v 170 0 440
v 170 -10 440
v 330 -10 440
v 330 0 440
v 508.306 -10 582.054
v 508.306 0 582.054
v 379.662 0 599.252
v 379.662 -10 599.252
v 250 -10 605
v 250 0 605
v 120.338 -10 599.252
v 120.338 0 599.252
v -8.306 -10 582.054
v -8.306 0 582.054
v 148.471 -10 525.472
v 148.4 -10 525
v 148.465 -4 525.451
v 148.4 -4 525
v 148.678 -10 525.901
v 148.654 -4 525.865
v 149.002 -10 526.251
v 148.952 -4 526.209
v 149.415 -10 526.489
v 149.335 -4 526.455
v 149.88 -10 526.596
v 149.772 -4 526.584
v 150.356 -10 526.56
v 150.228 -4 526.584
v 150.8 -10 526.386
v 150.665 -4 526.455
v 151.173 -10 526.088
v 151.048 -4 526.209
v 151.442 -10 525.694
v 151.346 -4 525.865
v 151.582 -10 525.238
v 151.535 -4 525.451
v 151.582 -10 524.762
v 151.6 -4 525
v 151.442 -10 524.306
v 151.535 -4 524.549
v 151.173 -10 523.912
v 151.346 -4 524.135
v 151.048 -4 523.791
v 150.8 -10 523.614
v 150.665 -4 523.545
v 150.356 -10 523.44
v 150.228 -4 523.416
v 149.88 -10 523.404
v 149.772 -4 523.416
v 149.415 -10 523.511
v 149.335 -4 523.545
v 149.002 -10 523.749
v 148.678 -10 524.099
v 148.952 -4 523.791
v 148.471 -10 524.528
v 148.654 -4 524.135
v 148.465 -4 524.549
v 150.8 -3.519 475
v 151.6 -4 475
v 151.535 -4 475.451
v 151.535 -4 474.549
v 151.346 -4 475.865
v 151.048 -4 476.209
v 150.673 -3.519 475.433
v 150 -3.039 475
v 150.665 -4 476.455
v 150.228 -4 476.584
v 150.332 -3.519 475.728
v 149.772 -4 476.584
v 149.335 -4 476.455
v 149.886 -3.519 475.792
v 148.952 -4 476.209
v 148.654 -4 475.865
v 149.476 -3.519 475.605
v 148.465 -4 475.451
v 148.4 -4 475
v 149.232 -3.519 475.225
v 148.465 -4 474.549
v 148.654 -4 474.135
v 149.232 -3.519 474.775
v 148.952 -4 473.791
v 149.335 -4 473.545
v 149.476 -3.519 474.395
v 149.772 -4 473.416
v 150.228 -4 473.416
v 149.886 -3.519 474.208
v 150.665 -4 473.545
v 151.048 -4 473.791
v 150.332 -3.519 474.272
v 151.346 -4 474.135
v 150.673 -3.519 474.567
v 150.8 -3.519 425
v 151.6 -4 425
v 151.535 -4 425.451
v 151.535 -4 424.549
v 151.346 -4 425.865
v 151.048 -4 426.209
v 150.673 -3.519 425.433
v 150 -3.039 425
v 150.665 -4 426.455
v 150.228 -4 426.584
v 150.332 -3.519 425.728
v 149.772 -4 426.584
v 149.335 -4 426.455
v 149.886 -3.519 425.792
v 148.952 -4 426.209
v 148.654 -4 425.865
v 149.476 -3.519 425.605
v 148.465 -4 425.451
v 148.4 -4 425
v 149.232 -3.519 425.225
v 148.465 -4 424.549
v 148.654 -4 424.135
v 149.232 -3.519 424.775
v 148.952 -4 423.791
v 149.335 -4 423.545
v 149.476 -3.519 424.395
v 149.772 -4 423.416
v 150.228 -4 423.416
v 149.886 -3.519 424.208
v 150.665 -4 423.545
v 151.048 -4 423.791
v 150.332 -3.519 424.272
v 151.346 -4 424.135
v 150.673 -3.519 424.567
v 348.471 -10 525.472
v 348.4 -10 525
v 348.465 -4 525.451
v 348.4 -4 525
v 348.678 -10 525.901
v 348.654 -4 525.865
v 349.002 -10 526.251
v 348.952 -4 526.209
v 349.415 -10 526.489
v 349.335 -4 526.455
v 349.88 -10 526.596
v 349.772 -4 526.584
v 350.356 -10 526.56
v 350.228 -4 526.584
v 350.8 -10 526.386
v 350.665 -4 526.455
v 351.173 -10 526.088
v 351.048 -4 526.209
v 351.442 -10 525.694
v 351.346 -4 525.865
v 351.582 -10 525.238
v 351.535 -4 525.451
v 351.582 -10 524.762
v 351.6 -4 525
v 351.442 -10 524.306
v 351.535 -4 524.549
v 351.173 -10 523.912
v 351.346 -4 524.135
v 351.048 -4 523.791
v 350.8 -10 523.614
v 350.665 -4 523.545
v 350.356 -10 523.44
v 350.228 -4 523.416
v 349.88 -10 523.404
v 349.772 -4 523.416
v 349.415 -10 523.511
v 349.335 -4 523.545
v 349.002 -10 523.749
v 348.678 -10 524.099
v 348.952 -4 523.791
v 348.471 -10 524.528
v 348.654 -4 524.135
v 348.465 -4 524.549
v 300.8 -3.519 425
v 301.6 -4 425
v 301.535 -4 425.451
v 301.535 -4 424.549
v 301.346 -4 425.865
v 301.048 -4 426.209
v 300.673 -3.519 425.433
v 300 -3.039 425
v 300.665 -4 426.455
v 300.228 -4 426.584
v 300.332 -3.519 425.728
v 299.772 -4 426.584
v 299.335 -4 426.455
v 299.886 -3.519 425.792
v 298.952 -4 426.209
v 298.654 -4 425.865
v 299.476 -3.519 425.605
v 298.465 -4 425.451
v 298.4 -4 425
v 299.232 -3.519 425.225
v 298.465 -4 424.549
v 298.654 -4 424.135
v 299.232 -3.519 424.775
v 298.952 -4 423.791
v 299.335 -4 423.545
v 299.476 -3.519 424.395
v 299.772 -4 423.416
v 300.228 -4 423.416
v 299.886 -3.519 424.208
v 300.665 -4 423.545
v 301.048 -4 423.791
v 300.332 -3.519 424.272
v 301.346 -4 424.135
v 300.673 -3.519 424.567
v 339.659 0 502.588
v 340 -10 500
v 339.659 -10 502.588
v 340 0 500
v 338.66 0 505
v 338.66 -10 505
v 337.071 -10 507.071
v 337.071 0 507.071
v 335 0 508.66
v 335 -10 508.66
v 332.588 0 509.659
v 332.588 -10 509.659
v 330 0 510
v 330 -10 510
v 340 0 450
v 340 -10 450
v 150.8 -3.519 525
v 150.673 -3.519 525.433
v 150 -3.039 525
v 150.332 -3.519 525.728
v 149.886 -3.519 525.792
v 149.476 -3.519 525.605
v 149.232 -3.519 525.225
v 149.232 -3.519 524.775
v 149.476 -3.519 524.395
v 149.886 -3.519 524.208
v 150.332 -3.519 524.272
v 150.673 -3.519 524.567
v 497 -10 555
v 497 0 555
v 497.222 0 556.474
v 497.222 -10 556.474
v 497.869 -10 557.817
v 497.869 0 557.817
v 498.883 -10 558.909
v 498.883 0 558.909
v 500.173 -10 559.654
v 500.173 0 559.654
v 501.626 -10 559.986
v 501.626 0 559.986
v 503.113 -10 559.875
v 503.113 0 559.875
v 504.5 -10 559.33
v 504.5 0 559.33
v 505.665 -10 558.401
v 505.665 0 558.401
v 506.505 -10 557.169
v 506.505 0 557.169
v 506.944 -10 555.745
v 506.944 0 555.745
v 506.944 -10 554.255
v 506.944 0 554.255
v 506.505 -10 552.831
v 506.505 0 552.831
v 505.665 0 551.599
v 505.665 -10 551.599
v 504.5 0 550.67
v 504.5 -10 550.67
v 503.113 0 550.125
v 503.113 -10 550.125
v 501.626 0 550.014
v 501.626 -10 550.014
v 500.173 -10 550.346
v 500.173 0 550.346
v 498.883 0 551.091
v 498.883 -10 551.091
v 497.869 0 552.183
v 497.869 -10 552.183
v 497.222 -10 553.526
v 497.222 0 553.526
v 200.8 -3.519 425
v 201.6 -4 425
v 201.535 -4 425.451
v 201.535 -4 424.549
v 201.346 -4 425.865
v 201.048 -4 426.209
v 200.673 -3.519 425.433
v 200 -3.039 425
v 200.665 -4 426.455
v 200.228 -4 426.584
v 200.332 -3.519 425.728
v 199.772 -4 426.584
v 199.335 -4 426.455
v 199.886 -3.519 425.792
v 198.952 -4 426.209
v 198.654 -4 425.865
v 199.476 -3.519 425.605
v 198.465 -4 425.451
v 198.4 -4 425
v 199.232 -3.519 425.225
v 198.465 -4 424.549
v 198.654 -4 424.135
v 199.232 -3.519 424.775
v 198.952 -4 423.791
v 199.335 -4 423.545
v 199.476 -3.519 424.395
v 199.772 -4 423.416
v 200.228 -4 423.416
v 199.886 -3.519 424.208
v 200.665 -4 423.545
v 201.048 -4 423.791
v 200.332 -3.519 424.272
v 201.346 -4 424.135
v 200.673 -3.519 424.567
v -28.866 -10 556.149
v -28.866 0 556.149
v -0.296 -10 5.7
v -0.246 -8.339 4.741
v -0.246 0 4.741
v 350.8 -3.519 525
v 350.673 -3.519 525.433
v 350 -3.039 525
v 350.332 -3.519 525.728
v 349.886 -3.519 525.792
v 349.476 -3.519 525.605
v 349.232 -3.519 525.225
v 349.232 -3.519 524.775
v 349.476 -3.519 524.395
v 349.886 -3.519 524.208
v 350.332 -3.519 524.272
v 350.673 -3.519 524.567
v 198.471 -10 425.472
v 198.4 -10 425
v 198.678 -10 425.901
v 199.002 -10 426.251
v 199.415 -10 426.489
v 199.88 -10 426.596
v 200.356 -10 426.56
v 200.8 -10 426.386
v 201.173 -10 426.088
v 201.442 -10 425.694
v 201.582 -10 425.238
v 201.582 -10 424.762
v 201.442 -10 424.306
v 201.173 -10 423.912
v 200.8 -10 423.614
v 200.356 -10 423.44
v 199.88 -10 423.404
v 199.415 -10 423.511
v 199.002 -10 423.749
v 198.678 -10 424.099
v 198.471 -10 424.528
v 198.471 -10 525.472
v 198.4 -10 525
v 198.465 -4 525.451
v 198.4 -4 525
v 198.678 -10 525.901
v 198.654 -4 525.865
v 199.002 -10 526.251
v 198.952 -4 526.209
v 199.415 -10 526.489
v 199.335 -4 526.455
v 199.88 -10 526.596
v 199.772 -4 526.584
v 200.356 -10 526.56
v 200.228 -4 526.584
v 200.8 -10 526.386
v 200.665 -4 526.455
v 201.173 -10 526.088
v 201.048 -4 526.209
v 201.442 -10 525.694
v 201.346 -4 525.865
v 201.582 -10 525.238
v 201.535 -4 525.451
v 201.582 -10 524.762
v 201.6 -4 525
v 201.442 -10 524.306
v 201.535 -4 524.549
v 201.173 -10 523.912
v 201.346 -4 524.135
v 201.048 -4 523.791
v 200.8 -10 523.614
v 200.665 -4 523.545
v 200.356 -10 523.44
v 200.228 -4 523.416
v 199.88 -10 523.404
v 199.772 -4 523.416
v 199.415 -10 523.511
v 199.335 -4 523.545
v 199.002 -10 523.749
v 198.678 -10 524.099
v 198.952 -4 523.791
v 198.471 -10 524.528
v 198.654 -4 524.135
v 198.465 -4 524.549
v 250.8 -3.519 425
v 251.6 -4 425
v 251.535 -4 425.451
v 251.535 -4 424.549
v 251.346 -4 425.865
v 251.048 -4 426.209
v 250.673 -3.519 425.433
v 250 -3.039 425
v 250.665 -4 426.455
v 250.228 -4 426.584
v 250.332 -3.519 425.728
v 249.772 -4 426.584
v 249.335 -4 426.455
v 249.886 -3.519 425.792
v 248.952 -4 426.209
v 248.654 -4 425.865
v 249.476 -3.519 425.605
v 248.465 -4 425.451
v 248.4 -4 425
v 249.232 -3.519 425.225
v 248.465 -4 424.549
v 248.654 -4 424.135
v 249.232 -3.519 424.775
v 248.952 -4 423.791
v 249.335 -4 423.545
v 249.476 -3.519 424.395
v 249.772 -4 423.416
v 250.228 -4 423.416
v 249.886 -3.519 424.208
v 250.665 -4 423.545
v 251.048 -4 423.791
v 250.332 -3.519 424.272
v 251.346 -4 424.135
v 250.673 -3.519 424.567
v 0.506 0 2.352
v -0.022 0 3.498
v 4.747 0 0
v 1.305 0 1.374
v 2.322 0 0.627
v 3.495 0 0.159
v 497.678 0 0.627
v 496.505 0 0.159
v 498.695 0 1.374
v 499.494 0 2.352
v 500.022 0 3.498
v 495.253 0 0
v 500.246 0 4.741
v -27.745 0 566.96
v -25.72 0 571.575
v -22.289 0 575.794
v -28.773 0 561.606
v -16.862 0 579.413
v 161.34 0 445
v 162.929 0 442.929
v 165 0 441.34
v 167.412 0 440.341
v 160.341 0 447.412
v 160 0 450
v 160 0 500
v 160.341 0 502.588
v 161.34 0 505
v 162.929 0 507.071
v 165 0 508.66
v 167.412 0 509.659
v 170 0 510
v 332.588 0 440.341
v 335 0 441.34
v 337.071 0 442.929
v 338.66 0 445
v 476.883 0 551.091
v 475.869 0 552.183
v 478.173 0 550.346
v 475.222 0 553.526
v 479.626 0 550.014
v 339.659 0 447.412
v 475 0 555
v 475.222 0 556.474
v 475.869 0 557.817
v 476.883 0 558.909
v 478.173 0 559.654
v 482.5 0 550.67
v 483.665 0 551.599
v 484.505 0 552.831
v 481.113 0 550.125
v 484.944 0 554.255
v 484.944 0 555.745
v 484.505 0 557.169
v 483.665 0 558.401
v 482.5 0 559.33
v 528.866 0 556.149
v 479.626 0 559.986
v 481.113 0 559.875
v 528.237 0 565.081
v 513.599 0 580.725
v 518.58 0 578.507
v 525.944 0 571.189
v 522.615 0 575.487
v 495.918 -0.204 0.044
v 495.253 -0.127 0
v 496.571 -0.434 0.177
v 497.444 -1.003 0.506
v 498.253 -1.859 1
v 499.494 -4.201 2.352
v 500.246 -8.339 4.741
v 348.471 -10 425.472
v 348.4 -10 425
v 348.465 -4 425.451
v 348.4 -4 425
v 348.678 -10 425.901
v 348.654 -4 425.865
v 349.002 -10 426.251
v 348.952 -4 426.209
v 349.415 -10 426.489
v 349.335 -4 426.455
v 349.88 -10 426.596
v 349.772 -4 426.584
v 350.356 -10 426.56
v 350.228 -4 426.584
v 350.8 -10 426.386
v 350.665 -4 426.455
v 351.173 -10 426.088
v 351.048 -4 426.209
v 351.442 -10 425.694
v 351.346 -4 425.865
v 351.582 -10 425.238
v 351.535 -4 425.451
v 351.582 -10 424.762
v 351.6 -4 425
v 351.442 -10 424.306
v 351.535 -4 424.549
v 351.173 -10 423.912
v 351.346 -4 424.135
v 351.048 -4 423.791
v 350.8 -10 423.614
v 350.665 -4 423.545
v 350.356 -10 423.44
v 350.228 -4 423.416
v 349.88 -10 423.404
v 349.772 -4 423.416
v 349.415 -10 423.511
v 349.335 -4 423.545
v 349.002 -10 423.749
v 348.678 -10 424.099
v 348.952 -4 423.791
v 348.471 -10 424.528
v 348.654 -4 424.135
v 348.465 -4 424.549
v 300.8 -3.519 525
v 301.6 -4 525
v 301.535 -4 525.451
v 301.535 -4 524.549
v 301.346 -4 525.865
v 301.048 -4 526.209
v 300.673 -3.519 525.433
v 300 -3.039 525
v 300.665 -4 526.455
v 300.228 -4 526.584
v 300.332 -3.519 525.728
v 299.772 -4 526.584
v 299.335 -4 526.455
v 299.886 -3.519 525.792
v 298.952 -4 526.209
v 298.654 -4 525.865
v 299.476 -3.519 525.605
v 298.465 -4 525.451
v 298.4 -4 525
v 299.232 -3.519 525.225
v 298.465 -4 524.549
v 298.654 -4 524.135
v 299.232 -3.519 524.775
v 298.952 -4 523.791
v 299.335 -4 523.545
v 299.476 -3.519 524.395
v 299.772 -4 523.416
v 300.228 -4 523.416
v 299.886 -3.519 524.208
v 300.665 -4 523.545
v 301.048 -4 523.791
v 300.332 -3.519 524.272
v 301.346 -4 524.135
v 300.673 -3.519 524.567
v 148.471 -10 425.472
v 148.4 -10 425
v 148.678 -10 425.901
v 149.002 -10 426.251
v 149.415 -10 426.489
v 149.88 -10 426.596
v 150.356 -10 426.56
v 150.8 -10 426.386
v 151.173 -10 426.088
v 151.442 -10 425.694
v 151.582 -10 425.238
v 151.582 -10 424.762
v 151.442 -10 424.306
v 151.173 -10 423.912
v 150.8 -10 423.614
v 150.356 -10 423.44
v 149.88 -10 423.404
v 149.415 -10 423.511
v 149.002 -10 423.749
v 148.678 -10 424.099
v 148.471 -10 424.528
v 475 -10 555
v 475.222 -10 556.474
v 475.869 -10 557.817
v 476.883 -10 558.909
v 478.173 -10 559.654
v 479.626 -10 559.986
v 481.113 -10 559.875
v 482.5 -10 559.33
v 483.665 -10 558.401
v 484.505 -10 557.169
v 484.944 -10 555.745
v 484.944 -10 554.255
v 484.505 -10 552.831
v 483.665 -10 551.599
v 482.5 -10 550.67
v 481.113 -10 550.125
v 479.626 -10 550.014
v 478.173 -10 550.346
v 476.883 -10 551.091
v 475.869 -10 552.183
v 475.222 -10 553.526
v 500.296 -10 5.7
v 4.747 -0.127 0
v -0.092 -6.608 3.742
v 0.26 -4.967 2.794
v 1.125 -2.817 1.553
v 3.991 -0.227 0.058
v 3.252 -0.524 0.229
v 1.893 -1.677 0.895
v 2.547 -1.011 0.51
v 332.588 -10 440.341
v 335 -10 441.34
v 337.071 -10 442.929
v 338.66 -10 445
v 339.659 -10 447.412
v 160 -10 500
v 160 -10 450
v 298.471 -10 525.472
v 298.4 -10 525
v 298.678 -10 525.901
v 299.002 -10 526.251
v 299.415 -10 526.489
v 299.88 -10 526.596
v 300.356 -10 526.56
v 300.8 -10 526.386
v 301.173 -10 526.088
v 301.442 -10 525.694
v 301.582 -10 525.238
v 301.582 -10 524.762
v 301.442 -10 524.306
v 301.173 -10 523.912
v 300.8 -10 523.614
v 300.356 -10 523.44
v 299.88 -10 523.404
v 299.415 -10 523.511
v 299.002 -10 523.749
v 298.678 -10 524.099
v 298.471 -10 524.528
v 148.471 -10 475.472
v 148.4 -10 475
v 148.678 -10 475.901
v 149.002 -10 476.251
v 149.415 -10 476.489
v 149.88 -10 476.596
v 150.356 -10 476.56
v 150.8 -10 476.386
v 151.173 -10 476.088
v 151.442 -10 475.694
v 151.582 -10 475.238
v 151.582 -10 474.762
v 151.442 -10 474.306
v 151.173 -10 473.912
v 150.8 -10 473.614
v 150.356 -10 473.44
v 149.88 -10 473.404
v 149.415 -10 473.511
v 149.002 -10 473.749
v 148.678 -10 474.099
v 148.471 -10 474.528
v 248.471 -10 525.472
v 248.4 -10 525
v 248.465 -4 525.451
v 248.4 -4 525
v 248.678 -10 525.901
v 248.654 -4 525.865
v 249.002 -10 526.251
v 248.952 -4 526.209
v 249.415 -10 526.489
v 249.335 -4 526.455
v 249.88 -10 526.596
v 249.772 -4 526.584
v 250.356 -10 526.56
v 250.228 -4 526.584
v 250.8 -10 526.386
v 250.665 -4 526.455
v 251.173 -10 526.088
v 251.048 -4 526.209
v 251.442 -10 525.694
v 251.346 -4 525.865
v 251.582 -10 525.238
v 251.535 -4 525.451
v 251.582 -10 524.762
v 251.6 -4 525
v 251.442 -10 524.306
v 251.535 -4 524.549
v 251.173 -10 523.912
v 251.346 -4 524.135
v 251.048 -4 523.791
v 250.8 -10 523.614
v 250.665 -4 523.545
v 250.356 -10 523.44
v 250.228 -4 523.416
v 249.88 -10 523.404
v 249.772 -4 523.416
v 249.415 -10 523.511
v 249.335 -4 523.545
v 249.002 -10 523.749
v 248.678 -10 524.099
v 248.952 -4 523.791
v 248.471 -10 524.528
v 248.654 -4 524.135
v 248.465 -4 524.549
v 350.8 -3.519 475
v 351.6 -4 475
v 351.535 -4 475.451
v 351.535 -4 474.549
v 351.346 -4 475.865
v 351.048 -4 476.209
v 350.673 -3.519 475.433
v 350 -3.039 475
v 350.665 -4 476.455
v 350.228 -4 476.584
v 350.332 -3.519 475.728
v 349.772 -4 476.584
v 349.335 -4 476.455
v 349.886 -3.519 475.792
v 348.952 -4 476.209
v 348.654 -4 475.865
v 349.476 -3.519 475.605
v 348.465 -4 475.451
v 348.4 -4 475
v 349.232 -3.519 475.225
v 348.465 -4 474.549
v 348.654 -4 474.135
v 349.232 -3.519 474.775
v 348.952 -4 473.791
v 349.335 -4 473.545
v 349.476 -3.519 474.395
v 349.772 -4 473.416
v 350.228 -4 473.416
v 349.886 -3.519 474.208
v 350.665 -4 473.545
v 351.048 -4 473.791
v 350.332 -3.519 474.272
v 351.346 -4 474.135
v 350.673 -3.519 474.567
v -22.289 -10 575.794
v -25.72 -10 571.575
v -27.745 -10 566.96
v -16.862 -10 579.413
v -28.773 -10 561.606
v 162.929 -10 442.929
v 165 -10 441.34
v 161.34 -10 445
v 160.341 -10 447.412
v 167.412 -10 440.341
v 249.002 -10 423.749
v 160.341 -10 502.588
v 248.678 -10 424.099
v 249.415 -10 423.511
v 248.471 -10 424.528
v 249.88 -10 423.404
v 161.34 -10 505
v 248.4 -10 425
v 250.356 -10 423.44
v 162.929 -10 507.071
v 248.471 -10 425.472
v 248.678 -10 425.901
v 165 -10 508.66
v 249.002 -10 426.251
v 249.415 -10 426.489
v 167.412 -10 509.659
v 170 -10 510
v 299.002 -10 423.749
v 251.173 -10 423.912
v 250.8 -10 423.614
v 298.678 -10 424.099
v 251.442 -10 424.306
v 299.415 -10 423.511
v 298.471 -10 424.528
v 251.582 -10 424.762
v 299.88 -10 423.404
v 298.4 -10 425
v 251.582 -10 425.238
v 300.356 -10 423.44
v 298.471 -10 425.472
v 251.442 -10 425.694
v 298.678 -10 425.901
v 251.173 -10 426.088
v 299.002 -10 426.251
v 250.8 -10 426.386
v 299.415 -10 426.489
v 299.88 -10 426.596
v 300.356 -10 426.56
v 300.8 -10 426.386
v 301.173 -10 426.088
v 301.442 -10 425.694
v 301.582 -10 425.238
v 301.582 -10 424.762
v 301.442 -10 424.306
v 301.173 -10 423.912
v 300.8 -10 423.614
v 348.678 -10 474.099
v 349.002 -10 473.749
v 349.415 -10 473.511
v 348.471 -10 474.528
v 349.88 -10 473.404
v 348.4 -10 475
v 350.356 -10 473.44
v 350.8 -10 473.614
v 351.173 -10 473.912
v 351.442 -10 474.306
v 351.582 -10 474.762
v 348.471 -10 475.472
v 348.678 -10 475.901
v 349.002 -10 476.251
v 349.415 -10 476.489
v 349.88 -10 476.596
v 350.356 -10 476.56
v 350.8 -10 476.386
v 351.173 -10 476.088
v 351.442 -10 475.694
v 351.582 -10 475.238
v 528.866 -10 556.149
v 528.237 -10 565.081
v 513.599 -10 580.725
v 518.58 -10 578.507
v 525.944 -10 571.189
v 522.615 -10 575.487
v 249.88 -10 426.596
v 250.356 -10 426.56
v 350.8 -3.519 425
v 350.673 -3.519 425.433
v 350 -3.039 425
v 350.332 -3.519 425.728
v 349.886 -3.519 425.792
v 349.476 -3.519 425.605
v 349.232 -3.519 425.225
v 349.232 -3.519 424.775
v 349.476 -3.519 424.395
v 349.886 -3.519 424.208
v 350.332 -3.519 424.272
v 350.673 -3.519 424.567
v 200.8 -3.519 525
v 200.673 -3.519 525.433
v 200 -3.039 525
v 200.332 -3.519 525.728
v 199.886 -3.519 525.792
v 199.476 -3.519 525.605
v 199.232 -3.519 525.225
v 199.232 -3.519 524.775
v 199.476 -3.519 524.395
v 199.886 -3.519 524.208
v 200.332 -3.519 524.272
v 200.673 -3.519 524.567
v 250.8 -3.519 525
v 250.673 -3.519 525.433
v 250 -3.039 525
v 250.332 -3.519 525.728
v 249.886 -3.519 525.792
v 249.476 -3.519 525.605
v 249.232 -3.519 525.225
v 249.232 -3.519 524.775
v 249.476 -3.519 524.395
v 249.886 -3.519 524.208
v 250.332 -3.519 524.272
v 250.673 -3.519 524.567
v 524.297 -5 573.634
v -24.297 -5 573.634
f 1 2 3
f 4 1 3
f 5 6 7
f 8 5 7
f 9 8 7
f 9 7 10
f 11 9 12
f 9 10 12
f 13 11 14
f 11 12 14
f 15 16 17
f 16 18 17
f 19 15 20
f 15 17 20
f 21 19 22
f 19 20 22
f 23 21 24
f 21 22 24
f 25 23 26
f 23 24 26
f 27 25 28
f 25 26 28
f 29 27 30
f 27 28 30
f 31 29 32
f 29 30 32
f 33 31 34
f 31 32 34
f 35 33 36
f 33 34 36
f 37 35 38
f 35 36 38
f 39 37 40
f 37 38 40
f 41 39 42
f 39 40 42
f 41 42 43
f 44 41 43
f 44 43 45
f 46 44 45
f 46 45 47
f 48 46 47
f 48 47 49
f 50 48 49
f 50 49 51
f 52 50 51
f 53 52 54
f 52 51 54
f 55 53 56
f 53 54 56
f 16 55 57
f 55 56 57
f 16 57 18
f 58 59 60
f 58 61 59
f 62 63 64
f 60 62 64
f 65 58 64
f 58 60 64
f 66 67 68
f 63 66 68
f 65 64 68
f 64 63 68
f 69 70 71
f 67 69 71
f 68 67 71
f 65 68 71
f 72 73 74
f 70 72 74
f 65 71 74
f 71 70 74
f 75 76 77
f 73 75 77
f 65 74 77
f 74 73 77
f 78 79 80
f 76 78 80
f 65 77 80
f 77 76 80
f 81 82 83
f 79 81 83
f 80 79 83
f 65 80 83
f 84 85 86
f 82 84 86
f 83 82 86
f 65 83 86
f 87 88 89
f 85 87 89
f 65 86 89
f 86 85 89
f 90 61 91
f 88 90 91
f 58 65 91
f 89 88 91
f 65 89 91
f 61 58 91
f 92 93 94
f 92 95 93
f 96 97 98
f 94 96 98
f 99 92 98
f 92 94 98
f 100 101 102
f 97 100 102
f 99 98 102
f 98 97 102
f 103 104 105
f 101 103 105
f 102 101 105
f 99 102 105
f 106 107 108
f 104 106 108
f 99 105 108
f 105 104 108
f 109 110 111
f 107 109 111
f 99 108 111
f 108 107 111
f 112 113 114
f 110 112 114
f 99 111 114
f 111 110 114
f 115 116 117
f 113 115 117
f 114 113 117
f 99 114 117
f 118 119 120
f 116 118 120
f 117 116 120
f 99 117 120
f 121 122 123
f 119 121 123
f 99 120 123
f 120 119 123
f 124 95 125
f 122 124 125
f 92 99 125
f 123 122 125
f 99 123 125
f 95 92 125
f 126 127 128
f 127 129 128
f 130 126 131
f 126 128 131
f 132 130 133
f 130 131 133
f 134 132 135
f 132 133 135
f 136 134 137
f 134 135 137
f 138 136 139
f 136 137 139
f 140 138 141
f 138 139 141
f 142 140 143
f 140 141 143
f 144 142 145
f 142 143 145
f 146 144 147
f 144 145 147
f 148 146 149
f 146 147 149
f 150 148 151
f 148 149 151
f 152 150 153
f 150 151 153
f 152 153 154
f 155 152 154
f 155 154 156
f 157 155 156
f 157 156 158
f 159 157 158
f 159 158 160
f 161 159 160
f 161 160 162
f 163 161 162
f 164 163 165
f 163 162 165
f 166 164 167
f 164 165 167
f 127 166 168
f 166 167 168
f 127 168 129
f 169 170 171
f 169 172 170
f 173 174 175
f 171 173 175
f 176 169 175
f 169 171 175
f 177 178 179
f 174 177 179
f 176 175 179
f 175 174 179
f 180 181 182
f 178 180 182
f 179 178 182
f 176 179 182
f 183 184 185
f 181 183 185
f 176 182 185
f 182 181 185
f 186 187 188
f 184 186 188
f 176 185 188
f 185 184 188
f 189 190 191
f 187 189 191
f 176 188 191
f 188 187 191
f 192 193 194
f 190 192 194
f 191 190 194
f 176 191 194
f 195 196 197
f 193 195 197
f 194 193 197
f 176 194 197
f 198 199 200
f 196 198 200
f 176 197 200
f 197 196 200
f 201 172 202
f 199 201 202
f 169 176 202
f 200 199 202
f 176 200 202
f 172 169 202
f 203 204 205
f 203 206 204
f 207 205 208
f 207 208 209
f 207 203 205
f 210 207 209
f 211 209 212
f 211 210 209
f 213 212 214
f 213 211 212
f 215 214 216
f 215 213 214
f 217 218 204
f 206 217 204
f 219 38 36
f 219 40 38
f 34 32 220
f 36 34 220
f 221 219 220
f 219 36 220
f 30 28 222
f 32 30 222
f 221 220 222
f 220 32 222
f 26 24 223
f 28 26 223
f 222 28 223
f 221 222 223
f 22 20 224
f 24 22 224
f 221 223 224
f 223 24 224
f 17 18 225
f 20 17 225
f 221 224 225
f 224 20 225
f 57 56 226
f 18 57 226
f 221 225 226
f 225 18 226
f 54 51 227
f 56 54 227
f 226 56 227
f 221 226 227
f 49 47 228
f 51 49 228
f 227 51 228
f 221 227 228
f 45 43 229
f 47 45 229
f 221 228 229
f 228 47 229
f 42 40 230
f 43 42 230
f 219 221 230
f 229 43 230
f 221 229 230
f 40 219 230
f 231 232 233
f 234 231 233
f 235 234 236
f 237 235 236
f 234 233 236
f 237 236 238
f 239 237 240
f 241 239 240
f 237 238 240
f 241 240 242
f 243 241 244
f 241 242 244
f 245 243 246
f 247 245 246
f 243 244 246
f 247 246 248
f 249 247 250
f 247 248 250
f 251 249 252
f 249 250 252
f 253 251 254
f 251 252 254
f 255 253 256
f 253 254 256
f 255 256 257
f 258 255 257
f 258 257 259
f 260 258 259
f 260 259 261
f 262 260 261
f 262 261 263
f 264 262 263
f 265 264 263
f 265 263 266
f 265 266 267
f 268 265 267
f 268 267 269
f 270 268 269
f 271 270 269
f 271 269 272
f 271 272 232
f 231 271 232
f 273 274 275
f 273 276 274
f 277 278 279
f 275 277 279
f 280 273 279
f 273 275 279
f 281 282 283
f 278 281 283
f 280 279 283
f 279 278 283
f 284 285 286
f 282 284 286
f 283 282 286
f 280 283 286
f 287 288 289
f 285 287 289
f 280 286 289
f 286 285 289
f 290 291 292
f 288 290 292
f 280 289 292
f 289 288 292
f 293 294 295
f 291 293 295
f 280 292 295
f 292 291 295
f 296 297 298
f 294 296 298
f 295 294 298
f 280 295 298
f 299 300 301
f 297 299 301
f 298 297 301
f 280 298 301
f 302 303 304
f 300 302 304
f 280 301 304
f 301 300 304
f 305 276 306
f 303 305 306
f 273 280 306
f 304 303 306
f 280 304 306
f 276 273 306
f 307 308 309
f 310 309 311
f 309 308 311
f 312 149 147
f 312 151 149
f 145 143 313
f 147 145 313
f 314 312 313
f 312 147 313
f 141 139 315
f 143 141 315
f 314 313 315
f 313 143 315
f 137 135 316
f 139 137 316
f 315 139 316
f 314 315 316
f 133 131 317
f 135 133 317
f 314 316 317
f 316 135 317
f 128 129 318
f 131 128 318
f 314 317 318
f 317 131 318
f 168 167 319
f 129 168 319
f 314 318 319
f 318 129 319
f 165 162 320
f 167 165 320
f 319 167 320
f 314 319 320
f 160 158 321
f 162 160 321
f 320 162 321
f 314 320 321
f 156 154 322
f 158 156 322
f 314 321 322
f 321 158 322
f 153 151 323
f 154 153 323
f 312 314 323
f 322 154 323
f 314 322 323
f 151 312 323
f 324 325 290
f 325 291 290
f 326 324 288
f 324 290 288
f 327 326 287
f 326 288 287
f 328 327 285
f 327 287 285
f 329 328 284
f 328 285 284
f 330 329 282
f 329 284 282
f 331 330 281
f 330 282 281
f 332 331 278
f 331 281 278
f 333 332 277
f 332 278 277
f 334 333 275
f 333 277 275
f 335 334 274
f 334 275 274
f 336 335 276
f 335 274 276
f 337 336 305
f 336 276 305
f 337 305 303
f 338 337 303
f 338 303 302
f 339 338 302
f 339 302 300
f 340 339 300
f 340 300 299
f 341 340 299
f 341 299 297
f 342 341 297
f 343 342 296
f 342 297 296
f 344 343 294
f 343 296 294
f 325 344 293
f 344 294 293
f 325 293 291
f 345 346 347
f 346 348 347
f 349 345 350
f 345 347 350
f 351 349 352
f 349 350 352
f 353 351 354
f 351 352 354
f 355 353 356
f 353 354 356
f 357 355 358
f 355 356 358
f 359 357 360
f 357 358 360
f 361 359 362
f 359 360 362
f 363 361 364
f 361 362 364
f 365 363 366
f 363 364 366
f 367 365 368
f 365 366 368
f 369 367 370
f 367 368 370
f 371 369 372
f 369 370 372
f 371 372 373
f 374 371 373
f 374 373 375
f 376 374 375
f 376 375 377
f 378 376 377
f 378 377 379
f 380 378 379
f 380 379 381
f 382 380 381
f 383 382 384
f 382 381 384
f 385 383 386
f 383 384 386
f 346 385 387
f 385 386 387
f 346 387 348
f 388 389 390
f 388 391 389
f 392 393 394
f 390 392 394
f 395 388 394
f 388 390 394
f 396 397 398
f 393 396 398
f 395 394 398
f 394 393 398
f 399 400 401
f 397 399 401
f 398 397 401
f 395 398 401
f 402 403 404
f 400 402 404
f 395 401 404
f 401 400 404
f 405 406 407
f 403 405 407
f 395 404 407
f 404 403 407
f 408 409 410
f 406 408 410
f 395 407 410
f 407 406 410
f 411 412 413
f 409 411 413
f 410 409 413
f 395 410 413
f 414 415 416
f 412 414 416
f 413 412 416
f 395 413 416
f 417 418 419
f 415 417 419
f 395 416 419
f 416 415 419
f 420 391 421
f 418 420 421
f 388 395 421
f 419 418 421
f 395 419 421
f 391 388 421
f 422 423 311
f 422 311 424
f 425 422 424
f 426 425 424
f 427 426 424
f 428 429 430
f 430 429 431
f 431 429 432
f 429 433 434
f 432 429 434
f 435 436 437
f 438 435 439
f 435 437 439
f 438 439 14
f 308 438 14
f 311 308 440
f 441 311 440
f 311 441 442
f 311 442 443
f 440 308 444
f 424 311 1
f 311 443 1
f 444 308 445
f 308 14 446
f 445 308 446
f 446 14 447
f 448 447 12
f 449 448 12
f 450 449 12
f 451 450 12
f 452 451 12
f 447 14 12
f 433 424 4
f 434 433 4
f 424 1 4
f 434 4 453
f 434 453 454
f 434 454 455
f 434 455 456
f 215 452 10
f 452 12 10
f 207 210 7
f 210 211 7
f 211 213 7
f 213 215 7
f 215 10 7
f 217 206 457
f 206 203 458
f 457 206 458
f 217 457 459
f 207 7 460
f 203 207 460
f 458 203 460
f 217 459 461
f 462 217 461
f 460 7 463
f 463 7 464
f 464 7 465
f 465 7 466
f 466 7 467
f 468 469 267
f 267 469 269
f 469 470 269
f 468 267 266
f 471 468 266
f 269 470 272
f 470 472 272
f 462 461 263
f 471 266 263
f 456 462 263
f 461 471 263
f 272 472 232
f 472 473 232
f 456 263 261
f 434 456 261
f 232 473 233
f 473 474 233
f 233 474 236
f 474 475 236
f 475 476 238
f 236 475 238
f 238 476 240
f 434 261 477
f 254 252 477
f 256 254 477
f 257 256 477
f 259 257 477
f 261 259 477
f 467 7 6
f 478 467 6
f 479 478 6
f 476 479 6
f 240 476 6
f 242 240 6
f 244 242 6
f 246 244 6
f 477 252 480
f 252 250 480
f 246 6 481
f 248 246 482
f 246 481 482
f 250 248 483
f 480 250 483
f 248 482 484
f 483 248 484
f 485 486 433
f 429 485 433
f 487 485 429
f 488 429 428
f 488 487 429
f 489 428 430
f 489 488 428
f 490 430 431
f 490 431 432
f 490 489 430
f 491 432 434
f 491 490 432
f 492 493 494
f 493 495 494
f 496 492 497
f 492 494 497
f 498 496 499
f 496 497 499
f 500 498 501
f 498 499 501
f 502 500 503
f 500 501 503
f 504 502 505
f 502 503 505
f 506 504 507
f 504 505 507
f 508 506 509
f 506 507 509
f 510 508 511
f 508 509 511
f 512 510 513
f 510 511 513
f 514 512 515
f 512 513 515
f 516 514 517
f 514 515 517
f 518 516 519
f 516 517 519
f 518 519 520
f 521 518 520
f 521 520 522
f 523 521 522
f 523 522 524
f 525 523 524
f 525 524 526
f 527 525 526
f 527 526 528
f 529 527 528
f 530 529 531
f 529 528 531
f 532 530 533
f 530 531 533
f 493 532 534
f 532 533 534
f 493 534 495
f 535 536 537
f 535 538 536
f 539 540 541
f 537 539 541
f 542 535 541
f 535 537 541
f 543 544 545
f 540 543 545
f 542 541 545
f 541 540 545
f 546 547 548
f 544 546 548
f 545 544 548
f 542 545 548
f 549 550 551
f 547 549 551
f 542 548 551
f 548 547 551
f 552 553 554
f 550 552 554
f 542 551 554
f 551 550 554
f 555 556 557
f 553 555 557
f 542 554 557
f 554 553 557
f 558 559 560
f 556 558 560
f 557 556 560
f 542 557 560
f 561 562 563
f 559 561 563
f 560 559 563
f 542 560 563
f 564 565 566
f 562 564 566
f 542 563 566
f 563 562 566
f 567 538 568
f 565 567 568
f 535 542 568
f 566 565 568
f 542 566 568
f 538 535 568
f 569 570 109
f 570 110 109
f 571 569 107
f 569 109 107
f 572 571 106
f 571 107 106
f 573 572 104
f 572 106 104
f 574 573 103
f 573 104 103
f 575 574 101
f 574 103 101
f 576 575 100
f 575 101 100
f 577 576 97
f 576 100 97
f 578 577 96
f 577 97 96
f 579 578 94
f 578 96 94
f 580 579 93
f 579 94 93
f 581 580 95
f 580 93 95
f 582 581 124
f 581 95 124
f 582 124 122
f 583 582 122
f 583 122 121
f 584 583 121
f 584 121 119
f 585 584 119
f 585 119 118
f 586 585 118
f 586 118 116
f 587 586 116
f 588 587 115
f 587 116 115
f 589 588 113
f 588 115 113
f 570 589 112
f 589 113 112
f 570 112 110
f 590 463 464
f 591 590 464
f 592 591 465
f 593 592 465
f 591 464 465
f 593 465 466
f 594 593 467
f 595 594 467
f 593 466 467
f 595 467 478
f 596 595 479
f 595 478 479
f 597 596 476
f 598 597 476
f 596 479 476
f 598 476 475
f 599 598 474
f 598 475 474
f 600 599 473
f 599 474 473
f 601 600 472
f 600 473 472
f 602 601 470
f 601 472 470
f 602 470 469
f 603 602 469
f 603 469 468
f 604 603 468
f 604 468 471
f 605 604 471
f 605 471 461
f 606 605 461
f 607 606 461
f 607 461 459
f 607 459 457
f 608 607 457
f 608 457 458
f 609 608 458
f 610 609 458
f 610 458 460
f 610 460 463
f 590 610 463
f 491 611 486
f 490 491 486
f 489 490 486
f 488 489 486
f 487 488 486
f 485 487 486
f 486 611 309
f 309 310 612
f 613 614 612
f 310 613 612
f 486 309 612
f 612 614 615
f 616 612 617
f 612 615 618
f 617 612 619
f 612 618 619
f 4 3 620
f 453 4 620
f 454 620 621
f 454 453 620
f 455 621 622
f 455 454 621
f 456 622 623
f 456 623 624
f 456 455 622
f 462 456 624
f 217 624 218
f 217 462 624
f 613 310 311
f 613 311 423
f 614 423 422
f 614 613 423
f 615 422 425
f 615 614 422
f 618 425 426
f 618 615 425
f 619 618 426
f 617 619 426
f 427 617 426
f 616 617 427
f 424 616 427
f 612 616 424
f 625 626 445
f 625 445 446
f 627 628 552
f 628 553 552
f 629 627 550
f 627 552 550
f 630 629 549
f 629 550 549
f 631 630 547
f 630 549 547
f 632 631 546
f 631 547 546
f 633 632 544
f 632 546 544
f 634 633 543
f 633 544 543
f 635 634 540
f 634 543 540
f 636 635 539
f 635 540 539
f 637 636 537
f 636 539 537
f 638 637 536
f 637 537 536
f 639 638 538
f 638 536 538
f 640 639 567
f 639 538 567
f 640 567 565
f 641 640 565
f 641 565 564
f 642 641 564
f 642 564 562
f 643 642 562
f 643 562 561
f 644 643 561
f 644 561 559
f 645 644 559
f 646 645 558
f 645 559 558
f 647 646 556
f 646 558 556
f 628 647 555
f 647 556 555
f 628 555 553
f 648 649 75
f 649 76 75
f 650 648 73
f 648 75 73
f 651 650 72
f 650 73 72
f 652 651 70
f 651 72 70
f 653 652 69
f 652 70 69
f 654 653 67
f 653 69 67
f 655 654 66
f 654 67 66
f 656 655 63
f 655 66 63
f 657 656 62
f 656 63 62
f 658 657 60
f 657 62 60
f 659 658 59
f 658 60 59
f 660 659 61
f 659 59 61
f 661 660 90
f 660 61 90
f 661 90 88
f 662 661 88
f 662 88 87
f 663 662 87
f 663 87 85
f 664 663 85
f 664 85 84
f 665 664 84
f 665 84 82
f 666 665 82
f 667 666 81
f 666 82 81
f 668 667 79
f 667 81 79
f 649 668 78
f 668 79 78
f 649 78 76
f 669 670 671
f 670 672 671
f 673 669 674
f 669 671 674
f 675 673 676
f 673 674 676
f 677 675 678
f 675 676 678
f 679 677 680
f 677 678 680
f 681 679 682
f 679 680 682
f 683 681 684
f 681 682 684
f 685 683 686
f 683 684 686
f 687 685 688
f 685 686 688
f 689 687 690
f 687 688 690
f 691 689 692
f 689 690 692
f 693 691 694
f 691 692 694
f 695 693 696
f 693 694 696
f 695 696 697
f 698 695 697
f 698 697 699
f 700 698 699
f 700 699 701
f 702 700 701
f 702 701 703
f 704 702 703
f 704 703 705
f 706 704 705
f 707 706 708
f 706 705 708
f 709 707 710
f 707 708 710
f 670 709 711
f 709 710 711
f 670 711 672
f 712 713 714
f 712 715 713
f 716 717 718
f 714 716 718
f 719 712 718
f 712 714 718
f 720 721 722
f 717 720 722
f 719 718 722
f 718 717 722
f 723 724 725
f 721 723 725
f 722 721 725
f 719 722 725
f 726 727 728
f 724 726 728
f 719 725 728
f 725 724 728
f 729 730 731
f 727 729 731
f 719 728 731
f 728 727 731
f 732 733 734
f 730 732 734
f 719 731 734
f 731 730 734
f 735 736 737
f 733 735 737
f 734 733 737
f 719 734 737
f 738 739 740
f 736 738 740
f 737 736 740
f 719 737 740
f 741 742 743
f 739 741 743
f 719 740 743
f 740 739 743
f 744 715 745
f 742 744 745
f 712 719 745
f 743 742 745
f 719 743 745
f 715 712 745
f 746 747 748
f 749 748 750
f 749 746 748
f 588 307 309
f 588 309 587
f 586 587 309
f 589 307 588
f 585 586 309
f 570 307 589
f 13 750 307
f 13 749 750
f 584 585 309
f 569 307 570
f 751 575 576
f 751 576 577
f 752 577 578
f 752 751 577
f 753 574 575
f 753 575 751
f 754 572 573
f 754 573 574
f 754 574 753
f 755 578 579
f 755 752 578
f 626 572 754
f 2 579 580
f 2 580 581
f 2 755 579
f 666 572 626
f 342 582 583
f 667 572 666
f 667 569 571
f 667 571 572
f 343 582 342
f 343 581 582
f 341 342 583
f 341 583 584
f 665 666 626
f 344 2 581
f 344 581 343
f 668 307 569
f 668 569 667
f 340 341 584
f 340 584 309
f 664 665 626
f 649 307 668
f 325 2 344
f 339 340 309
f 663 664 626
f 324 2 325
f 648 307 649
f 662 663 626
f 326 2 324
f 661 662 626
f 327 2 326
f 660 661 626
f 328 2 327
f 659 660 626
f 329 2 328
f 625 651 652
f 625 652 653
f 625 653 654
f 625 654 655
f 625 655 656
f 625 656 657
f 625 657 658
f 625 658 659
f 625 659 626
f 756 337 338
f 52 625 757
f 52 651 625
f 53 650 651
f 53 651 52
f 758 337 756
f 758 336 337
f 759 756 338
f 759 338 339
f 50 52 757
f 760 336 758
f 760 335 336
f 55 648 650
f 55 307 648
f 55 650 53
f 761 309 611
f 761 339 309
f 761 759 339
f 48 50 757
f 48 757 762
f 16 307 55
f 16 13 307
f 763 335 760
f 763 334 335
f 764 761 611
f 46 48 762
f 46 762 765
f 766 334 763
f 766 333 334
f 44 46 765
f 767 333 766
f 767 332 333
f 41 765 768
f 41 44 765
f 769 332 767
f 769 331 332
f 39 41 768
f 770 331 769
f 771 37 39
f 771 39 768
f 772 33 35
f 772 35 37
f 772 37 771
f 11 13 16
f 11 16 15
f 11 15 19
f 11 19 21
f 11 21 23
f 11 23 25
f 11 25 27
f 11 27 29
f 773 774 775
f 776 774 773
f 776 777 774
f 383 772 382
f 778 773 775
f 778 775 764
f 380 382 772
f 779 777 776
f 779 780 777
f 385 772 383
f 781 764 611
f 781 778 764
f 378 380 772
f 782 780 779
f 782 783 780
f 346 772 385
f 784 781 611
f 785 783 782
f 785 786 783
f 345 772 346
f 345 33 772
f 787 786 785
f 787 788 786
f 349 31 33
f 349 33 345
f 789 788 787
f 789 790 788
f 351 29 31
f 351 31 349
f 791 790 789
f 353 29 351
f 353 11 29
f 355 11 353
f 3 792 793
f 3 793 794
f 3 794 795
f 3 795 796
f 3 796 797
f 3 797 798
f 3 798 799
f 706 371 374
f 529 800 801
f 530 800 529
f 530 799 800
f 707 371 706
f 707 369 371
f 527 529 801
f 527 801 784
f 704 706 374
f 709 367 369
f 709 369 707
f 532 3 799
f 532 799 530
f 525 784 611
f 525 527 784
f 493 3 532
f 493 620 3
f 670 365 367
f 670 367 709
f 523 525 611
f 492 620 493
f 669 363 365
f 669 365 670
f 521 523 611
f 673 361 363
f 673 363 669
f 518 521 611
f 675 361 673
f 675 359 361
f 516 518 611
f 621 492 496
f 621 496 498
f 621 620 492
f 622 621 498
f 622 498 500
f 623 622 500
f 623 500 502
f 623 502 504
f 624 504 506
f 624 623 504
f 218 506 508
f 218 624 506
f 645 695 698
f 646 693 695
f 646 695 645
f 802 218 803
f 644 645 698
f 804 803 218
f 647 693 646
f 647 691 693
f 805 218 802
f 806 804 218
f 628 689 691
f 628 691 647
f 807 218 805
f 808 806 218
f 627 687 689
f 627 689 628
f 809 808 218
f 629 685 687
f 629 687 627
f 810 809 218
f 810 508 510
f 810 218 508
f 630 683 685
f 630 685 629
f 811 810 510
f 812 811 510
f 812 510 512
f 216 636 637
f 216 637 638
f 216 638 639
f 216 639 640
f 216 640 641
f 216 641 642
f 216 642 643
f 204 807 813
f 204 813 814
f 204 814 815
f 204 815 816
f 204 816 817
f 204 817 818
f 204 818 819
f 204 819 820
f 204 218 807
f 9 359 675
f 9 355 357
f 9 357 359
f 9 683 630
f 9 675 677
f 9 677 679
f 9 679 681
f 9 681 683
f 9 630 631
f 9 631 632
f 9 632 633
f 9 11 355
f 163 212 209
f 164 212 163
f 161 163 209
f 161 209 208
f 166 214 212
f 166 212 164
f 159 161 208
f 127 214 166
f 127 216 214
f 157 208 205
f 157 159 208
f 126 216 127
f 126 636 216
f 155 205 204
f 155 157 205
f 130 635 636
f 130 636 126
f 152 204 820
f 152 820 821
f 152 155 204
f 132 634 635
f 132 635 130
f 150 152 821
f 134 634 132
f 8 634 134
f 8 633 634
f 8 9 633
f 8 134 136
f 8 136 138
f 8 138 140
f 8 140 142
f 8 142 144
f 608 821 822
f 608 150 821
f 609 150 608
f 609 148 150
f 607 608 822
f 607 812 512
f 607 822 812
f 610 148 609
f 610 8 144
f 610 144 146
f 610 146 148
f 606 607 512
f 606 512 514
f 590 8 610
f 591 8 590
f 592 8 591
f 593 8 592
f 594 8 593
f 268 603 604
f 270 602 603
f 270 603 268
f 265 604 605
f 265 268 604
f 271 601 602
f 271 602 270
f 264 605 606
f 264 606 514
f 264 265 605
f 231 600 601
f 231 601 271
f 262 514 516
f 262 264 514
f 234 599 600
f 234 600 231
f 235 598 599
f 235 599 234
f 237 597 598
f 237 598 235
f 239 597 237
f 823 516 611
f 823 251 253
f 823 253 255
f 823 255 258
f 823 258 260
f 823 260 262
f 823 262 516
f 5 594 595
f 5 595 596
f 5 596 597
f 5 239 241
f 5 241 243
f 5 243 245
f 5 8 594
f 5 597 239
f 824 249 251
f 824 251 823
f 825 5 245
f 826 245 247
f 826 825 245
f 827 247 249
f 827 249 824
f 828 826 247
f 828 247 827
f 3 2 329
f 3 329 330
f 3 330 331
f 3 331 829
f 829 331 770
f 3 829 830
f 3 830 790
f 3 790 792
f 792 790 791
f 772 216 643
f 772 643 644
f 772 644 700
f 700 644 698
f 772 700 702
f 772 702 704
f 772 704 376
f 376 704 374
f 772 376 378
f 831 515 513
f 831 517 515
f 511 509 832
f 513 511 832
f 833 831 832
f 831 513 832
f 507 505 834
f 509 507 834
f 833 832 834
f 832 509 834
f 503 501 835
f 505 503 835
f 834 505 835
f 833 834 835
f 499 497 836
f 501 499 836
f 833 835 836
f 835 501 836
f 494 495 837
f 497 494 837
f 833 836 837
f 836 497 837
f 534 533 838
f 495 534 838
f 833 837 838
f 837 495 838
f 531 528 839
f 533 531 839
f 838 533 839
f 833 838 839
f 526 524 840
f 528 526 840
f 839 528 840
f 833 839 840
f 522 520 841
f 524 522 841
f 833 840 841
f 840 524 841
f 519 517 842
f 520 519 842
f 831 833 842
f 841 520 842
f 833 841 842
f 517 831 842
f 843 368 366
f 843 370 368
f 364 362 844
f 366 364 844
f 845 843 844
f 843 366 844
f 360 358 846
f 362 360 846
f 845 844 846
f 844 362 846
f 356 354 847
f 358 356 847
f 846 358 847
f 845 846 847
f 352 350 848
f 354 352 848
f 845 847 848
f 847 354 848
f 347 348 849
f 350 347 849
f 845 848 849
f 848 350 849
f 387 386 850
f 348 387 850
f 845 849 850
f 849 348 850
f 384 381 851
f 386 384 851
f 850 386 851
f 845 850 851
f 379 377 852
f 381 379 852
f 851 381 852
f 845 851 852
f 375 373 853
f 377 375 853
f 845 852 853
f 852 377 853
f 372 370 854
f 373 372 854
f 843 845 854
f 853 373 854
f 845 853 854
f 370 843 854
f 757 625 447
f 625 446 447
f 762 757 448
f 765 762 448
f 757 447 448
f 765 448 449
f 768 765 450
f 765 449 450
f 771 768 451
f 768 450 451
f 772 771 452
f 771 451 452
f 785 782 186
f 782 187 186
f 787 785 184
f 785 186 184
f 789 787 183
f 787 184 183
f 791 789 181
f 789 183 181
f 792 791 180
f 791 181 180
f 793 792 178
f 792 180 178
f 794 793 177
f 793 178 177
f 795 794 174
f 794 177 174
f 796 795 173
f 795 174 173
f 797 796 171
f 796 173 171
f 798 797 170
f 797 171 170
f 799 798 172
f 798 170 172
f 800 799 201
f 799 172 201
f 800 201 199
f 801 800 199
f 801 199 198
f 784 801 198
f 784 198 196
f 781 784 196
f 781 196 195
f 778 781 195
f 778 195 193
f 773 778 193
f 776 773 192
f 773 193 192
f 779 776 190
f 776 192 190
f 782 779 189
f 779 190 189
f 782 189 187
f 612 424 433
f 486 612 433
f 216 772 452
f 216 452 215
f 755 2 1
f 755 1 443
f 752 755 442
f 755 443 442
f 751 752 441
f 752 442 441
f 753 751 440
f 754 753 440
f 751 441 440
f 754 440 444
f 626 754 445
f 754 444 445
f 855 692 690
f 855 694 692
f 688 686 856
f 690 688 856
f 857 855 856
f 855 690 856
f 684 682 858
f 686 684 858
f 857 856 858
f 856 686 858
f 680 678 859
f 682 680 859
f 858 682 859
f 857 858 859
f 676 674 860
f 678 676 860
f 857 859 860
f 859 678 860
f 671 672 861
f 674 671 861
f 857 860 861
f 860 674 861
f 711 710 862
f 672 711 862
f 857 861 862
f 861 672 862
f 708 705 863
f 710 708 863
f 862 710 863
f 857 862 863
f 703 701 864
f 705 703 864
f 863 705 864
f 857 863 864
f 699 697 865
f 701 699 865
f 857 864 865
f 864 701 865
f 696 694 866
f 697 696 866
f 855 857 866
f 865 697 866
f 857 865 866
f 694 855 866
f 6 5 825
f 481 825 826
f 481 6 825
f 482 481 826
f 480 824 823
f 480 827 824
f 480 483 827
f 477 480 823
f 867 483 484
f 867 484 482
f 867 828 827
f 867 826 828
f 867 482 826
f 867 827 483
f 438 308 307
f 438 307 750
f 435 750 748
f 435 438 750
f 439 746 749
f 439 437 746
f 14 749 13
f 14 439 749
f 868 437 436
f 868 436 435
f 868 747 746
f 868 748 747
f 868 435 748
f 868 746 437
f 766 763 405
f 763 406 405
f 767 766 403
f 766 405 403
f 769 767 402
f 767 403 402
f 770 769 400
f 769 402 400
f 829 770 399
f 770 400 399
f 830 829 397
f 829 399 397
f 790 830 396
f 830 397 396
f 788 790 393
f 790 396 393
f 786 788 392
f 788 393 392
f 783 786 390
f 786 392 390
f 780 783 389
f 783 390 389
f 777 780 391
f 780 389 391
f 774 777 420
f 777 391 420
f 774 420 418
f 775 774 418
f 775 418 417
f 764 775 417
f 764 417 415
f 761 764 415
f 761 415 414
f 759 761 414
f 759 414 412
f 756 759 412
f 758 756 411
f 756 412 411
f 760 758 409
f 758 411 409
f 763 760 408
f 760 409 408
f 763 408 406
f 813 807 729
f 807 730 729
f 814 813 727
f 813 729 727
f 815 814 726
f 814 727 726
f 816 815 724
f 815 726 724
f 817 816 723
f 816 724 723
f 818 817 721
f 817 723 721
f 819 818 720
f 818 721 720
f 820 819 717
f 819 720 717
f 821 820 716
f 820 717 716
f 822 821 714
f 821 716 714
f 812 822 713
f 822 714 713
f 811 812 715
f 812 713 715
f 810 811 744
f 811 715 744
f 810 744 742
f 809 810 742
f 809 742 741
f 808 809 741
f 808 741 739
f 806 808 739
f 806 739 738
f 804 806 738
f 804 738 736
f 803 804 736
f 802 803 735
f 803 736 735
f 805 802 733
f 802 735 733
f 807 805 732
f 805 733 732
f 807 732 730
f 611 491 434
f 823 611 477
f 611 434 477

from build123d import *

# Parameters (mm, degrees)
F1_DEPTH    = 10
F2_W        = 180
F2_H        = 70
F3_DEPTH    = 10.001
F4_T1_DEPTH = 120.3455223822
F5_R        = 5
F6_T1_DEPTH = 541.5885597996
F7_R        = 10
F9_D        = 3.2
F9_DEPTH    = 6
F9_TIP      = 0.9613769904
F11_D       = 10


# Not quite as in the source:
# - a fillet or chamfer that OpenCascade refuses, or shapes differently, is made with other operations: its cross-section is extruded or revolved along the edge and cut away or added


with BuildPart() as f1:
    # F0 (on Front) → F1 (new body)
    with BuildSketch(Plane.XZ):
        with BuildLine():
            Line((-30, 578), (0, 0))
            Line((0, 0), (500, 0))
            Line((500, 0), (530, 578))
            ThreePointArc((530, 578), (250, 605), (-30, 578))
        make_face()
    extrude(amount=F1_DEPTH)

    # F2 (on face) → F3 (cut, through all)
    with BuildSketch(Plane.XZ.offset(10)):
        with Locations((250, 475)):
            Rectangle(F2_W, F2_H)
    extrude(amount=-F3_DEPTH, mode=Mode.SUBTRACT)

    # F4: fillet of radius 25 on 2 edges, made by hand

    # F4_s2 → F4_t1 (cut)
    with BuildSketch(Plane.XZ.offset(-55.1727611911)):
        with BuildLine():
            add(Edge.make_bspline(
                [(-28.865884536, 556.1493753933), (-30.0086821523, 578.1672761351), (-8.3063912994, 582.0537283993)],
                knots=[0, 0, 0, 1, 1, 1], degree=2, weights=[1, 1, 1]))
            ThreePointArc((-8.3063912994, 582.0537283993), (-19.1608272147, 580.0677046728), (-30, 578))
            Line((-30, 578), (-28.865884536, 556.1493753933))
        make_face()
        with BuildLine():
            add(Edge.make_bspline(
                [(508.3063912994, 582.0537283993), (530.0086821523, 578.1672761351), (528.865884536, 556.1493753933)],
                knots=[0, 0, 0, 1, 1, 1], degree=2, weights=[1, 1, 1]))
            Line((528.865884536, 556.1493753933), (530, 578))
            ThreePointArc((530, 578), (519.1608272147, 580.0677046728), (508.3063912994, 582.0537283993))
        make_face()
    extrude(amount=F4_T1_DEPTH, mode=Mode.SUBTRACT)

    # F5
    f5_edges = [f1.edges().sort_by_distance(p)[0] for p in [
        (500, -5, 0),
        (0, -5, 0),
    ]]
    fillet(f5_edges, radius=F5_R)

    # F6: chamfer of 5.7 x 9.8726896031 on 1 edges, made by hand

    # F6_s2 → F6_t1 (cut)
    with BuildSketch(Plane.YZ.offset(-20.7942798998)):
        Polygon((-10, 5.7), (-0.1273103969, 0), (-10, 0), align=None)
    extrude(amount=F6_T1_DEPTH, mode=Mode.SUBTRACT)

    # F7
    f7_edges = [f1.edges().sort_by_distance(p)[0] for p in [
        (340, -5, 510),
        (160, -5, 510),
        (160, -5, 440),
        (340, -5, 440),
    ]]
    fillet(f7_edges, radius=F7_R)

    # F9
    with Locations(Plane.XZ.offset(10)):
        with Locations((150, 525), (200, 525), (250, 525), (250, 425), (200, 425), (150, 425), (150, 475), (350, 525), (350, 475), (350, 425), (300, 425), (300, 525)):
            Hole(F9_D / 2, depth=F9_DEPTH)
            with Locations((0, 0, -(F9_DEPTH + F9_TIP / 2))):  # 118° drill point
                Cone(0, F9_D / 2, F9_TIP, mode=Mode.SUBTRACT)

    # F11 (through all)
    with Locations(Plane.XZ.offset(10)):
        with Locations((480, 555), (502, 555)):
            Hole(F11_D / 2)


solid = f1.part
